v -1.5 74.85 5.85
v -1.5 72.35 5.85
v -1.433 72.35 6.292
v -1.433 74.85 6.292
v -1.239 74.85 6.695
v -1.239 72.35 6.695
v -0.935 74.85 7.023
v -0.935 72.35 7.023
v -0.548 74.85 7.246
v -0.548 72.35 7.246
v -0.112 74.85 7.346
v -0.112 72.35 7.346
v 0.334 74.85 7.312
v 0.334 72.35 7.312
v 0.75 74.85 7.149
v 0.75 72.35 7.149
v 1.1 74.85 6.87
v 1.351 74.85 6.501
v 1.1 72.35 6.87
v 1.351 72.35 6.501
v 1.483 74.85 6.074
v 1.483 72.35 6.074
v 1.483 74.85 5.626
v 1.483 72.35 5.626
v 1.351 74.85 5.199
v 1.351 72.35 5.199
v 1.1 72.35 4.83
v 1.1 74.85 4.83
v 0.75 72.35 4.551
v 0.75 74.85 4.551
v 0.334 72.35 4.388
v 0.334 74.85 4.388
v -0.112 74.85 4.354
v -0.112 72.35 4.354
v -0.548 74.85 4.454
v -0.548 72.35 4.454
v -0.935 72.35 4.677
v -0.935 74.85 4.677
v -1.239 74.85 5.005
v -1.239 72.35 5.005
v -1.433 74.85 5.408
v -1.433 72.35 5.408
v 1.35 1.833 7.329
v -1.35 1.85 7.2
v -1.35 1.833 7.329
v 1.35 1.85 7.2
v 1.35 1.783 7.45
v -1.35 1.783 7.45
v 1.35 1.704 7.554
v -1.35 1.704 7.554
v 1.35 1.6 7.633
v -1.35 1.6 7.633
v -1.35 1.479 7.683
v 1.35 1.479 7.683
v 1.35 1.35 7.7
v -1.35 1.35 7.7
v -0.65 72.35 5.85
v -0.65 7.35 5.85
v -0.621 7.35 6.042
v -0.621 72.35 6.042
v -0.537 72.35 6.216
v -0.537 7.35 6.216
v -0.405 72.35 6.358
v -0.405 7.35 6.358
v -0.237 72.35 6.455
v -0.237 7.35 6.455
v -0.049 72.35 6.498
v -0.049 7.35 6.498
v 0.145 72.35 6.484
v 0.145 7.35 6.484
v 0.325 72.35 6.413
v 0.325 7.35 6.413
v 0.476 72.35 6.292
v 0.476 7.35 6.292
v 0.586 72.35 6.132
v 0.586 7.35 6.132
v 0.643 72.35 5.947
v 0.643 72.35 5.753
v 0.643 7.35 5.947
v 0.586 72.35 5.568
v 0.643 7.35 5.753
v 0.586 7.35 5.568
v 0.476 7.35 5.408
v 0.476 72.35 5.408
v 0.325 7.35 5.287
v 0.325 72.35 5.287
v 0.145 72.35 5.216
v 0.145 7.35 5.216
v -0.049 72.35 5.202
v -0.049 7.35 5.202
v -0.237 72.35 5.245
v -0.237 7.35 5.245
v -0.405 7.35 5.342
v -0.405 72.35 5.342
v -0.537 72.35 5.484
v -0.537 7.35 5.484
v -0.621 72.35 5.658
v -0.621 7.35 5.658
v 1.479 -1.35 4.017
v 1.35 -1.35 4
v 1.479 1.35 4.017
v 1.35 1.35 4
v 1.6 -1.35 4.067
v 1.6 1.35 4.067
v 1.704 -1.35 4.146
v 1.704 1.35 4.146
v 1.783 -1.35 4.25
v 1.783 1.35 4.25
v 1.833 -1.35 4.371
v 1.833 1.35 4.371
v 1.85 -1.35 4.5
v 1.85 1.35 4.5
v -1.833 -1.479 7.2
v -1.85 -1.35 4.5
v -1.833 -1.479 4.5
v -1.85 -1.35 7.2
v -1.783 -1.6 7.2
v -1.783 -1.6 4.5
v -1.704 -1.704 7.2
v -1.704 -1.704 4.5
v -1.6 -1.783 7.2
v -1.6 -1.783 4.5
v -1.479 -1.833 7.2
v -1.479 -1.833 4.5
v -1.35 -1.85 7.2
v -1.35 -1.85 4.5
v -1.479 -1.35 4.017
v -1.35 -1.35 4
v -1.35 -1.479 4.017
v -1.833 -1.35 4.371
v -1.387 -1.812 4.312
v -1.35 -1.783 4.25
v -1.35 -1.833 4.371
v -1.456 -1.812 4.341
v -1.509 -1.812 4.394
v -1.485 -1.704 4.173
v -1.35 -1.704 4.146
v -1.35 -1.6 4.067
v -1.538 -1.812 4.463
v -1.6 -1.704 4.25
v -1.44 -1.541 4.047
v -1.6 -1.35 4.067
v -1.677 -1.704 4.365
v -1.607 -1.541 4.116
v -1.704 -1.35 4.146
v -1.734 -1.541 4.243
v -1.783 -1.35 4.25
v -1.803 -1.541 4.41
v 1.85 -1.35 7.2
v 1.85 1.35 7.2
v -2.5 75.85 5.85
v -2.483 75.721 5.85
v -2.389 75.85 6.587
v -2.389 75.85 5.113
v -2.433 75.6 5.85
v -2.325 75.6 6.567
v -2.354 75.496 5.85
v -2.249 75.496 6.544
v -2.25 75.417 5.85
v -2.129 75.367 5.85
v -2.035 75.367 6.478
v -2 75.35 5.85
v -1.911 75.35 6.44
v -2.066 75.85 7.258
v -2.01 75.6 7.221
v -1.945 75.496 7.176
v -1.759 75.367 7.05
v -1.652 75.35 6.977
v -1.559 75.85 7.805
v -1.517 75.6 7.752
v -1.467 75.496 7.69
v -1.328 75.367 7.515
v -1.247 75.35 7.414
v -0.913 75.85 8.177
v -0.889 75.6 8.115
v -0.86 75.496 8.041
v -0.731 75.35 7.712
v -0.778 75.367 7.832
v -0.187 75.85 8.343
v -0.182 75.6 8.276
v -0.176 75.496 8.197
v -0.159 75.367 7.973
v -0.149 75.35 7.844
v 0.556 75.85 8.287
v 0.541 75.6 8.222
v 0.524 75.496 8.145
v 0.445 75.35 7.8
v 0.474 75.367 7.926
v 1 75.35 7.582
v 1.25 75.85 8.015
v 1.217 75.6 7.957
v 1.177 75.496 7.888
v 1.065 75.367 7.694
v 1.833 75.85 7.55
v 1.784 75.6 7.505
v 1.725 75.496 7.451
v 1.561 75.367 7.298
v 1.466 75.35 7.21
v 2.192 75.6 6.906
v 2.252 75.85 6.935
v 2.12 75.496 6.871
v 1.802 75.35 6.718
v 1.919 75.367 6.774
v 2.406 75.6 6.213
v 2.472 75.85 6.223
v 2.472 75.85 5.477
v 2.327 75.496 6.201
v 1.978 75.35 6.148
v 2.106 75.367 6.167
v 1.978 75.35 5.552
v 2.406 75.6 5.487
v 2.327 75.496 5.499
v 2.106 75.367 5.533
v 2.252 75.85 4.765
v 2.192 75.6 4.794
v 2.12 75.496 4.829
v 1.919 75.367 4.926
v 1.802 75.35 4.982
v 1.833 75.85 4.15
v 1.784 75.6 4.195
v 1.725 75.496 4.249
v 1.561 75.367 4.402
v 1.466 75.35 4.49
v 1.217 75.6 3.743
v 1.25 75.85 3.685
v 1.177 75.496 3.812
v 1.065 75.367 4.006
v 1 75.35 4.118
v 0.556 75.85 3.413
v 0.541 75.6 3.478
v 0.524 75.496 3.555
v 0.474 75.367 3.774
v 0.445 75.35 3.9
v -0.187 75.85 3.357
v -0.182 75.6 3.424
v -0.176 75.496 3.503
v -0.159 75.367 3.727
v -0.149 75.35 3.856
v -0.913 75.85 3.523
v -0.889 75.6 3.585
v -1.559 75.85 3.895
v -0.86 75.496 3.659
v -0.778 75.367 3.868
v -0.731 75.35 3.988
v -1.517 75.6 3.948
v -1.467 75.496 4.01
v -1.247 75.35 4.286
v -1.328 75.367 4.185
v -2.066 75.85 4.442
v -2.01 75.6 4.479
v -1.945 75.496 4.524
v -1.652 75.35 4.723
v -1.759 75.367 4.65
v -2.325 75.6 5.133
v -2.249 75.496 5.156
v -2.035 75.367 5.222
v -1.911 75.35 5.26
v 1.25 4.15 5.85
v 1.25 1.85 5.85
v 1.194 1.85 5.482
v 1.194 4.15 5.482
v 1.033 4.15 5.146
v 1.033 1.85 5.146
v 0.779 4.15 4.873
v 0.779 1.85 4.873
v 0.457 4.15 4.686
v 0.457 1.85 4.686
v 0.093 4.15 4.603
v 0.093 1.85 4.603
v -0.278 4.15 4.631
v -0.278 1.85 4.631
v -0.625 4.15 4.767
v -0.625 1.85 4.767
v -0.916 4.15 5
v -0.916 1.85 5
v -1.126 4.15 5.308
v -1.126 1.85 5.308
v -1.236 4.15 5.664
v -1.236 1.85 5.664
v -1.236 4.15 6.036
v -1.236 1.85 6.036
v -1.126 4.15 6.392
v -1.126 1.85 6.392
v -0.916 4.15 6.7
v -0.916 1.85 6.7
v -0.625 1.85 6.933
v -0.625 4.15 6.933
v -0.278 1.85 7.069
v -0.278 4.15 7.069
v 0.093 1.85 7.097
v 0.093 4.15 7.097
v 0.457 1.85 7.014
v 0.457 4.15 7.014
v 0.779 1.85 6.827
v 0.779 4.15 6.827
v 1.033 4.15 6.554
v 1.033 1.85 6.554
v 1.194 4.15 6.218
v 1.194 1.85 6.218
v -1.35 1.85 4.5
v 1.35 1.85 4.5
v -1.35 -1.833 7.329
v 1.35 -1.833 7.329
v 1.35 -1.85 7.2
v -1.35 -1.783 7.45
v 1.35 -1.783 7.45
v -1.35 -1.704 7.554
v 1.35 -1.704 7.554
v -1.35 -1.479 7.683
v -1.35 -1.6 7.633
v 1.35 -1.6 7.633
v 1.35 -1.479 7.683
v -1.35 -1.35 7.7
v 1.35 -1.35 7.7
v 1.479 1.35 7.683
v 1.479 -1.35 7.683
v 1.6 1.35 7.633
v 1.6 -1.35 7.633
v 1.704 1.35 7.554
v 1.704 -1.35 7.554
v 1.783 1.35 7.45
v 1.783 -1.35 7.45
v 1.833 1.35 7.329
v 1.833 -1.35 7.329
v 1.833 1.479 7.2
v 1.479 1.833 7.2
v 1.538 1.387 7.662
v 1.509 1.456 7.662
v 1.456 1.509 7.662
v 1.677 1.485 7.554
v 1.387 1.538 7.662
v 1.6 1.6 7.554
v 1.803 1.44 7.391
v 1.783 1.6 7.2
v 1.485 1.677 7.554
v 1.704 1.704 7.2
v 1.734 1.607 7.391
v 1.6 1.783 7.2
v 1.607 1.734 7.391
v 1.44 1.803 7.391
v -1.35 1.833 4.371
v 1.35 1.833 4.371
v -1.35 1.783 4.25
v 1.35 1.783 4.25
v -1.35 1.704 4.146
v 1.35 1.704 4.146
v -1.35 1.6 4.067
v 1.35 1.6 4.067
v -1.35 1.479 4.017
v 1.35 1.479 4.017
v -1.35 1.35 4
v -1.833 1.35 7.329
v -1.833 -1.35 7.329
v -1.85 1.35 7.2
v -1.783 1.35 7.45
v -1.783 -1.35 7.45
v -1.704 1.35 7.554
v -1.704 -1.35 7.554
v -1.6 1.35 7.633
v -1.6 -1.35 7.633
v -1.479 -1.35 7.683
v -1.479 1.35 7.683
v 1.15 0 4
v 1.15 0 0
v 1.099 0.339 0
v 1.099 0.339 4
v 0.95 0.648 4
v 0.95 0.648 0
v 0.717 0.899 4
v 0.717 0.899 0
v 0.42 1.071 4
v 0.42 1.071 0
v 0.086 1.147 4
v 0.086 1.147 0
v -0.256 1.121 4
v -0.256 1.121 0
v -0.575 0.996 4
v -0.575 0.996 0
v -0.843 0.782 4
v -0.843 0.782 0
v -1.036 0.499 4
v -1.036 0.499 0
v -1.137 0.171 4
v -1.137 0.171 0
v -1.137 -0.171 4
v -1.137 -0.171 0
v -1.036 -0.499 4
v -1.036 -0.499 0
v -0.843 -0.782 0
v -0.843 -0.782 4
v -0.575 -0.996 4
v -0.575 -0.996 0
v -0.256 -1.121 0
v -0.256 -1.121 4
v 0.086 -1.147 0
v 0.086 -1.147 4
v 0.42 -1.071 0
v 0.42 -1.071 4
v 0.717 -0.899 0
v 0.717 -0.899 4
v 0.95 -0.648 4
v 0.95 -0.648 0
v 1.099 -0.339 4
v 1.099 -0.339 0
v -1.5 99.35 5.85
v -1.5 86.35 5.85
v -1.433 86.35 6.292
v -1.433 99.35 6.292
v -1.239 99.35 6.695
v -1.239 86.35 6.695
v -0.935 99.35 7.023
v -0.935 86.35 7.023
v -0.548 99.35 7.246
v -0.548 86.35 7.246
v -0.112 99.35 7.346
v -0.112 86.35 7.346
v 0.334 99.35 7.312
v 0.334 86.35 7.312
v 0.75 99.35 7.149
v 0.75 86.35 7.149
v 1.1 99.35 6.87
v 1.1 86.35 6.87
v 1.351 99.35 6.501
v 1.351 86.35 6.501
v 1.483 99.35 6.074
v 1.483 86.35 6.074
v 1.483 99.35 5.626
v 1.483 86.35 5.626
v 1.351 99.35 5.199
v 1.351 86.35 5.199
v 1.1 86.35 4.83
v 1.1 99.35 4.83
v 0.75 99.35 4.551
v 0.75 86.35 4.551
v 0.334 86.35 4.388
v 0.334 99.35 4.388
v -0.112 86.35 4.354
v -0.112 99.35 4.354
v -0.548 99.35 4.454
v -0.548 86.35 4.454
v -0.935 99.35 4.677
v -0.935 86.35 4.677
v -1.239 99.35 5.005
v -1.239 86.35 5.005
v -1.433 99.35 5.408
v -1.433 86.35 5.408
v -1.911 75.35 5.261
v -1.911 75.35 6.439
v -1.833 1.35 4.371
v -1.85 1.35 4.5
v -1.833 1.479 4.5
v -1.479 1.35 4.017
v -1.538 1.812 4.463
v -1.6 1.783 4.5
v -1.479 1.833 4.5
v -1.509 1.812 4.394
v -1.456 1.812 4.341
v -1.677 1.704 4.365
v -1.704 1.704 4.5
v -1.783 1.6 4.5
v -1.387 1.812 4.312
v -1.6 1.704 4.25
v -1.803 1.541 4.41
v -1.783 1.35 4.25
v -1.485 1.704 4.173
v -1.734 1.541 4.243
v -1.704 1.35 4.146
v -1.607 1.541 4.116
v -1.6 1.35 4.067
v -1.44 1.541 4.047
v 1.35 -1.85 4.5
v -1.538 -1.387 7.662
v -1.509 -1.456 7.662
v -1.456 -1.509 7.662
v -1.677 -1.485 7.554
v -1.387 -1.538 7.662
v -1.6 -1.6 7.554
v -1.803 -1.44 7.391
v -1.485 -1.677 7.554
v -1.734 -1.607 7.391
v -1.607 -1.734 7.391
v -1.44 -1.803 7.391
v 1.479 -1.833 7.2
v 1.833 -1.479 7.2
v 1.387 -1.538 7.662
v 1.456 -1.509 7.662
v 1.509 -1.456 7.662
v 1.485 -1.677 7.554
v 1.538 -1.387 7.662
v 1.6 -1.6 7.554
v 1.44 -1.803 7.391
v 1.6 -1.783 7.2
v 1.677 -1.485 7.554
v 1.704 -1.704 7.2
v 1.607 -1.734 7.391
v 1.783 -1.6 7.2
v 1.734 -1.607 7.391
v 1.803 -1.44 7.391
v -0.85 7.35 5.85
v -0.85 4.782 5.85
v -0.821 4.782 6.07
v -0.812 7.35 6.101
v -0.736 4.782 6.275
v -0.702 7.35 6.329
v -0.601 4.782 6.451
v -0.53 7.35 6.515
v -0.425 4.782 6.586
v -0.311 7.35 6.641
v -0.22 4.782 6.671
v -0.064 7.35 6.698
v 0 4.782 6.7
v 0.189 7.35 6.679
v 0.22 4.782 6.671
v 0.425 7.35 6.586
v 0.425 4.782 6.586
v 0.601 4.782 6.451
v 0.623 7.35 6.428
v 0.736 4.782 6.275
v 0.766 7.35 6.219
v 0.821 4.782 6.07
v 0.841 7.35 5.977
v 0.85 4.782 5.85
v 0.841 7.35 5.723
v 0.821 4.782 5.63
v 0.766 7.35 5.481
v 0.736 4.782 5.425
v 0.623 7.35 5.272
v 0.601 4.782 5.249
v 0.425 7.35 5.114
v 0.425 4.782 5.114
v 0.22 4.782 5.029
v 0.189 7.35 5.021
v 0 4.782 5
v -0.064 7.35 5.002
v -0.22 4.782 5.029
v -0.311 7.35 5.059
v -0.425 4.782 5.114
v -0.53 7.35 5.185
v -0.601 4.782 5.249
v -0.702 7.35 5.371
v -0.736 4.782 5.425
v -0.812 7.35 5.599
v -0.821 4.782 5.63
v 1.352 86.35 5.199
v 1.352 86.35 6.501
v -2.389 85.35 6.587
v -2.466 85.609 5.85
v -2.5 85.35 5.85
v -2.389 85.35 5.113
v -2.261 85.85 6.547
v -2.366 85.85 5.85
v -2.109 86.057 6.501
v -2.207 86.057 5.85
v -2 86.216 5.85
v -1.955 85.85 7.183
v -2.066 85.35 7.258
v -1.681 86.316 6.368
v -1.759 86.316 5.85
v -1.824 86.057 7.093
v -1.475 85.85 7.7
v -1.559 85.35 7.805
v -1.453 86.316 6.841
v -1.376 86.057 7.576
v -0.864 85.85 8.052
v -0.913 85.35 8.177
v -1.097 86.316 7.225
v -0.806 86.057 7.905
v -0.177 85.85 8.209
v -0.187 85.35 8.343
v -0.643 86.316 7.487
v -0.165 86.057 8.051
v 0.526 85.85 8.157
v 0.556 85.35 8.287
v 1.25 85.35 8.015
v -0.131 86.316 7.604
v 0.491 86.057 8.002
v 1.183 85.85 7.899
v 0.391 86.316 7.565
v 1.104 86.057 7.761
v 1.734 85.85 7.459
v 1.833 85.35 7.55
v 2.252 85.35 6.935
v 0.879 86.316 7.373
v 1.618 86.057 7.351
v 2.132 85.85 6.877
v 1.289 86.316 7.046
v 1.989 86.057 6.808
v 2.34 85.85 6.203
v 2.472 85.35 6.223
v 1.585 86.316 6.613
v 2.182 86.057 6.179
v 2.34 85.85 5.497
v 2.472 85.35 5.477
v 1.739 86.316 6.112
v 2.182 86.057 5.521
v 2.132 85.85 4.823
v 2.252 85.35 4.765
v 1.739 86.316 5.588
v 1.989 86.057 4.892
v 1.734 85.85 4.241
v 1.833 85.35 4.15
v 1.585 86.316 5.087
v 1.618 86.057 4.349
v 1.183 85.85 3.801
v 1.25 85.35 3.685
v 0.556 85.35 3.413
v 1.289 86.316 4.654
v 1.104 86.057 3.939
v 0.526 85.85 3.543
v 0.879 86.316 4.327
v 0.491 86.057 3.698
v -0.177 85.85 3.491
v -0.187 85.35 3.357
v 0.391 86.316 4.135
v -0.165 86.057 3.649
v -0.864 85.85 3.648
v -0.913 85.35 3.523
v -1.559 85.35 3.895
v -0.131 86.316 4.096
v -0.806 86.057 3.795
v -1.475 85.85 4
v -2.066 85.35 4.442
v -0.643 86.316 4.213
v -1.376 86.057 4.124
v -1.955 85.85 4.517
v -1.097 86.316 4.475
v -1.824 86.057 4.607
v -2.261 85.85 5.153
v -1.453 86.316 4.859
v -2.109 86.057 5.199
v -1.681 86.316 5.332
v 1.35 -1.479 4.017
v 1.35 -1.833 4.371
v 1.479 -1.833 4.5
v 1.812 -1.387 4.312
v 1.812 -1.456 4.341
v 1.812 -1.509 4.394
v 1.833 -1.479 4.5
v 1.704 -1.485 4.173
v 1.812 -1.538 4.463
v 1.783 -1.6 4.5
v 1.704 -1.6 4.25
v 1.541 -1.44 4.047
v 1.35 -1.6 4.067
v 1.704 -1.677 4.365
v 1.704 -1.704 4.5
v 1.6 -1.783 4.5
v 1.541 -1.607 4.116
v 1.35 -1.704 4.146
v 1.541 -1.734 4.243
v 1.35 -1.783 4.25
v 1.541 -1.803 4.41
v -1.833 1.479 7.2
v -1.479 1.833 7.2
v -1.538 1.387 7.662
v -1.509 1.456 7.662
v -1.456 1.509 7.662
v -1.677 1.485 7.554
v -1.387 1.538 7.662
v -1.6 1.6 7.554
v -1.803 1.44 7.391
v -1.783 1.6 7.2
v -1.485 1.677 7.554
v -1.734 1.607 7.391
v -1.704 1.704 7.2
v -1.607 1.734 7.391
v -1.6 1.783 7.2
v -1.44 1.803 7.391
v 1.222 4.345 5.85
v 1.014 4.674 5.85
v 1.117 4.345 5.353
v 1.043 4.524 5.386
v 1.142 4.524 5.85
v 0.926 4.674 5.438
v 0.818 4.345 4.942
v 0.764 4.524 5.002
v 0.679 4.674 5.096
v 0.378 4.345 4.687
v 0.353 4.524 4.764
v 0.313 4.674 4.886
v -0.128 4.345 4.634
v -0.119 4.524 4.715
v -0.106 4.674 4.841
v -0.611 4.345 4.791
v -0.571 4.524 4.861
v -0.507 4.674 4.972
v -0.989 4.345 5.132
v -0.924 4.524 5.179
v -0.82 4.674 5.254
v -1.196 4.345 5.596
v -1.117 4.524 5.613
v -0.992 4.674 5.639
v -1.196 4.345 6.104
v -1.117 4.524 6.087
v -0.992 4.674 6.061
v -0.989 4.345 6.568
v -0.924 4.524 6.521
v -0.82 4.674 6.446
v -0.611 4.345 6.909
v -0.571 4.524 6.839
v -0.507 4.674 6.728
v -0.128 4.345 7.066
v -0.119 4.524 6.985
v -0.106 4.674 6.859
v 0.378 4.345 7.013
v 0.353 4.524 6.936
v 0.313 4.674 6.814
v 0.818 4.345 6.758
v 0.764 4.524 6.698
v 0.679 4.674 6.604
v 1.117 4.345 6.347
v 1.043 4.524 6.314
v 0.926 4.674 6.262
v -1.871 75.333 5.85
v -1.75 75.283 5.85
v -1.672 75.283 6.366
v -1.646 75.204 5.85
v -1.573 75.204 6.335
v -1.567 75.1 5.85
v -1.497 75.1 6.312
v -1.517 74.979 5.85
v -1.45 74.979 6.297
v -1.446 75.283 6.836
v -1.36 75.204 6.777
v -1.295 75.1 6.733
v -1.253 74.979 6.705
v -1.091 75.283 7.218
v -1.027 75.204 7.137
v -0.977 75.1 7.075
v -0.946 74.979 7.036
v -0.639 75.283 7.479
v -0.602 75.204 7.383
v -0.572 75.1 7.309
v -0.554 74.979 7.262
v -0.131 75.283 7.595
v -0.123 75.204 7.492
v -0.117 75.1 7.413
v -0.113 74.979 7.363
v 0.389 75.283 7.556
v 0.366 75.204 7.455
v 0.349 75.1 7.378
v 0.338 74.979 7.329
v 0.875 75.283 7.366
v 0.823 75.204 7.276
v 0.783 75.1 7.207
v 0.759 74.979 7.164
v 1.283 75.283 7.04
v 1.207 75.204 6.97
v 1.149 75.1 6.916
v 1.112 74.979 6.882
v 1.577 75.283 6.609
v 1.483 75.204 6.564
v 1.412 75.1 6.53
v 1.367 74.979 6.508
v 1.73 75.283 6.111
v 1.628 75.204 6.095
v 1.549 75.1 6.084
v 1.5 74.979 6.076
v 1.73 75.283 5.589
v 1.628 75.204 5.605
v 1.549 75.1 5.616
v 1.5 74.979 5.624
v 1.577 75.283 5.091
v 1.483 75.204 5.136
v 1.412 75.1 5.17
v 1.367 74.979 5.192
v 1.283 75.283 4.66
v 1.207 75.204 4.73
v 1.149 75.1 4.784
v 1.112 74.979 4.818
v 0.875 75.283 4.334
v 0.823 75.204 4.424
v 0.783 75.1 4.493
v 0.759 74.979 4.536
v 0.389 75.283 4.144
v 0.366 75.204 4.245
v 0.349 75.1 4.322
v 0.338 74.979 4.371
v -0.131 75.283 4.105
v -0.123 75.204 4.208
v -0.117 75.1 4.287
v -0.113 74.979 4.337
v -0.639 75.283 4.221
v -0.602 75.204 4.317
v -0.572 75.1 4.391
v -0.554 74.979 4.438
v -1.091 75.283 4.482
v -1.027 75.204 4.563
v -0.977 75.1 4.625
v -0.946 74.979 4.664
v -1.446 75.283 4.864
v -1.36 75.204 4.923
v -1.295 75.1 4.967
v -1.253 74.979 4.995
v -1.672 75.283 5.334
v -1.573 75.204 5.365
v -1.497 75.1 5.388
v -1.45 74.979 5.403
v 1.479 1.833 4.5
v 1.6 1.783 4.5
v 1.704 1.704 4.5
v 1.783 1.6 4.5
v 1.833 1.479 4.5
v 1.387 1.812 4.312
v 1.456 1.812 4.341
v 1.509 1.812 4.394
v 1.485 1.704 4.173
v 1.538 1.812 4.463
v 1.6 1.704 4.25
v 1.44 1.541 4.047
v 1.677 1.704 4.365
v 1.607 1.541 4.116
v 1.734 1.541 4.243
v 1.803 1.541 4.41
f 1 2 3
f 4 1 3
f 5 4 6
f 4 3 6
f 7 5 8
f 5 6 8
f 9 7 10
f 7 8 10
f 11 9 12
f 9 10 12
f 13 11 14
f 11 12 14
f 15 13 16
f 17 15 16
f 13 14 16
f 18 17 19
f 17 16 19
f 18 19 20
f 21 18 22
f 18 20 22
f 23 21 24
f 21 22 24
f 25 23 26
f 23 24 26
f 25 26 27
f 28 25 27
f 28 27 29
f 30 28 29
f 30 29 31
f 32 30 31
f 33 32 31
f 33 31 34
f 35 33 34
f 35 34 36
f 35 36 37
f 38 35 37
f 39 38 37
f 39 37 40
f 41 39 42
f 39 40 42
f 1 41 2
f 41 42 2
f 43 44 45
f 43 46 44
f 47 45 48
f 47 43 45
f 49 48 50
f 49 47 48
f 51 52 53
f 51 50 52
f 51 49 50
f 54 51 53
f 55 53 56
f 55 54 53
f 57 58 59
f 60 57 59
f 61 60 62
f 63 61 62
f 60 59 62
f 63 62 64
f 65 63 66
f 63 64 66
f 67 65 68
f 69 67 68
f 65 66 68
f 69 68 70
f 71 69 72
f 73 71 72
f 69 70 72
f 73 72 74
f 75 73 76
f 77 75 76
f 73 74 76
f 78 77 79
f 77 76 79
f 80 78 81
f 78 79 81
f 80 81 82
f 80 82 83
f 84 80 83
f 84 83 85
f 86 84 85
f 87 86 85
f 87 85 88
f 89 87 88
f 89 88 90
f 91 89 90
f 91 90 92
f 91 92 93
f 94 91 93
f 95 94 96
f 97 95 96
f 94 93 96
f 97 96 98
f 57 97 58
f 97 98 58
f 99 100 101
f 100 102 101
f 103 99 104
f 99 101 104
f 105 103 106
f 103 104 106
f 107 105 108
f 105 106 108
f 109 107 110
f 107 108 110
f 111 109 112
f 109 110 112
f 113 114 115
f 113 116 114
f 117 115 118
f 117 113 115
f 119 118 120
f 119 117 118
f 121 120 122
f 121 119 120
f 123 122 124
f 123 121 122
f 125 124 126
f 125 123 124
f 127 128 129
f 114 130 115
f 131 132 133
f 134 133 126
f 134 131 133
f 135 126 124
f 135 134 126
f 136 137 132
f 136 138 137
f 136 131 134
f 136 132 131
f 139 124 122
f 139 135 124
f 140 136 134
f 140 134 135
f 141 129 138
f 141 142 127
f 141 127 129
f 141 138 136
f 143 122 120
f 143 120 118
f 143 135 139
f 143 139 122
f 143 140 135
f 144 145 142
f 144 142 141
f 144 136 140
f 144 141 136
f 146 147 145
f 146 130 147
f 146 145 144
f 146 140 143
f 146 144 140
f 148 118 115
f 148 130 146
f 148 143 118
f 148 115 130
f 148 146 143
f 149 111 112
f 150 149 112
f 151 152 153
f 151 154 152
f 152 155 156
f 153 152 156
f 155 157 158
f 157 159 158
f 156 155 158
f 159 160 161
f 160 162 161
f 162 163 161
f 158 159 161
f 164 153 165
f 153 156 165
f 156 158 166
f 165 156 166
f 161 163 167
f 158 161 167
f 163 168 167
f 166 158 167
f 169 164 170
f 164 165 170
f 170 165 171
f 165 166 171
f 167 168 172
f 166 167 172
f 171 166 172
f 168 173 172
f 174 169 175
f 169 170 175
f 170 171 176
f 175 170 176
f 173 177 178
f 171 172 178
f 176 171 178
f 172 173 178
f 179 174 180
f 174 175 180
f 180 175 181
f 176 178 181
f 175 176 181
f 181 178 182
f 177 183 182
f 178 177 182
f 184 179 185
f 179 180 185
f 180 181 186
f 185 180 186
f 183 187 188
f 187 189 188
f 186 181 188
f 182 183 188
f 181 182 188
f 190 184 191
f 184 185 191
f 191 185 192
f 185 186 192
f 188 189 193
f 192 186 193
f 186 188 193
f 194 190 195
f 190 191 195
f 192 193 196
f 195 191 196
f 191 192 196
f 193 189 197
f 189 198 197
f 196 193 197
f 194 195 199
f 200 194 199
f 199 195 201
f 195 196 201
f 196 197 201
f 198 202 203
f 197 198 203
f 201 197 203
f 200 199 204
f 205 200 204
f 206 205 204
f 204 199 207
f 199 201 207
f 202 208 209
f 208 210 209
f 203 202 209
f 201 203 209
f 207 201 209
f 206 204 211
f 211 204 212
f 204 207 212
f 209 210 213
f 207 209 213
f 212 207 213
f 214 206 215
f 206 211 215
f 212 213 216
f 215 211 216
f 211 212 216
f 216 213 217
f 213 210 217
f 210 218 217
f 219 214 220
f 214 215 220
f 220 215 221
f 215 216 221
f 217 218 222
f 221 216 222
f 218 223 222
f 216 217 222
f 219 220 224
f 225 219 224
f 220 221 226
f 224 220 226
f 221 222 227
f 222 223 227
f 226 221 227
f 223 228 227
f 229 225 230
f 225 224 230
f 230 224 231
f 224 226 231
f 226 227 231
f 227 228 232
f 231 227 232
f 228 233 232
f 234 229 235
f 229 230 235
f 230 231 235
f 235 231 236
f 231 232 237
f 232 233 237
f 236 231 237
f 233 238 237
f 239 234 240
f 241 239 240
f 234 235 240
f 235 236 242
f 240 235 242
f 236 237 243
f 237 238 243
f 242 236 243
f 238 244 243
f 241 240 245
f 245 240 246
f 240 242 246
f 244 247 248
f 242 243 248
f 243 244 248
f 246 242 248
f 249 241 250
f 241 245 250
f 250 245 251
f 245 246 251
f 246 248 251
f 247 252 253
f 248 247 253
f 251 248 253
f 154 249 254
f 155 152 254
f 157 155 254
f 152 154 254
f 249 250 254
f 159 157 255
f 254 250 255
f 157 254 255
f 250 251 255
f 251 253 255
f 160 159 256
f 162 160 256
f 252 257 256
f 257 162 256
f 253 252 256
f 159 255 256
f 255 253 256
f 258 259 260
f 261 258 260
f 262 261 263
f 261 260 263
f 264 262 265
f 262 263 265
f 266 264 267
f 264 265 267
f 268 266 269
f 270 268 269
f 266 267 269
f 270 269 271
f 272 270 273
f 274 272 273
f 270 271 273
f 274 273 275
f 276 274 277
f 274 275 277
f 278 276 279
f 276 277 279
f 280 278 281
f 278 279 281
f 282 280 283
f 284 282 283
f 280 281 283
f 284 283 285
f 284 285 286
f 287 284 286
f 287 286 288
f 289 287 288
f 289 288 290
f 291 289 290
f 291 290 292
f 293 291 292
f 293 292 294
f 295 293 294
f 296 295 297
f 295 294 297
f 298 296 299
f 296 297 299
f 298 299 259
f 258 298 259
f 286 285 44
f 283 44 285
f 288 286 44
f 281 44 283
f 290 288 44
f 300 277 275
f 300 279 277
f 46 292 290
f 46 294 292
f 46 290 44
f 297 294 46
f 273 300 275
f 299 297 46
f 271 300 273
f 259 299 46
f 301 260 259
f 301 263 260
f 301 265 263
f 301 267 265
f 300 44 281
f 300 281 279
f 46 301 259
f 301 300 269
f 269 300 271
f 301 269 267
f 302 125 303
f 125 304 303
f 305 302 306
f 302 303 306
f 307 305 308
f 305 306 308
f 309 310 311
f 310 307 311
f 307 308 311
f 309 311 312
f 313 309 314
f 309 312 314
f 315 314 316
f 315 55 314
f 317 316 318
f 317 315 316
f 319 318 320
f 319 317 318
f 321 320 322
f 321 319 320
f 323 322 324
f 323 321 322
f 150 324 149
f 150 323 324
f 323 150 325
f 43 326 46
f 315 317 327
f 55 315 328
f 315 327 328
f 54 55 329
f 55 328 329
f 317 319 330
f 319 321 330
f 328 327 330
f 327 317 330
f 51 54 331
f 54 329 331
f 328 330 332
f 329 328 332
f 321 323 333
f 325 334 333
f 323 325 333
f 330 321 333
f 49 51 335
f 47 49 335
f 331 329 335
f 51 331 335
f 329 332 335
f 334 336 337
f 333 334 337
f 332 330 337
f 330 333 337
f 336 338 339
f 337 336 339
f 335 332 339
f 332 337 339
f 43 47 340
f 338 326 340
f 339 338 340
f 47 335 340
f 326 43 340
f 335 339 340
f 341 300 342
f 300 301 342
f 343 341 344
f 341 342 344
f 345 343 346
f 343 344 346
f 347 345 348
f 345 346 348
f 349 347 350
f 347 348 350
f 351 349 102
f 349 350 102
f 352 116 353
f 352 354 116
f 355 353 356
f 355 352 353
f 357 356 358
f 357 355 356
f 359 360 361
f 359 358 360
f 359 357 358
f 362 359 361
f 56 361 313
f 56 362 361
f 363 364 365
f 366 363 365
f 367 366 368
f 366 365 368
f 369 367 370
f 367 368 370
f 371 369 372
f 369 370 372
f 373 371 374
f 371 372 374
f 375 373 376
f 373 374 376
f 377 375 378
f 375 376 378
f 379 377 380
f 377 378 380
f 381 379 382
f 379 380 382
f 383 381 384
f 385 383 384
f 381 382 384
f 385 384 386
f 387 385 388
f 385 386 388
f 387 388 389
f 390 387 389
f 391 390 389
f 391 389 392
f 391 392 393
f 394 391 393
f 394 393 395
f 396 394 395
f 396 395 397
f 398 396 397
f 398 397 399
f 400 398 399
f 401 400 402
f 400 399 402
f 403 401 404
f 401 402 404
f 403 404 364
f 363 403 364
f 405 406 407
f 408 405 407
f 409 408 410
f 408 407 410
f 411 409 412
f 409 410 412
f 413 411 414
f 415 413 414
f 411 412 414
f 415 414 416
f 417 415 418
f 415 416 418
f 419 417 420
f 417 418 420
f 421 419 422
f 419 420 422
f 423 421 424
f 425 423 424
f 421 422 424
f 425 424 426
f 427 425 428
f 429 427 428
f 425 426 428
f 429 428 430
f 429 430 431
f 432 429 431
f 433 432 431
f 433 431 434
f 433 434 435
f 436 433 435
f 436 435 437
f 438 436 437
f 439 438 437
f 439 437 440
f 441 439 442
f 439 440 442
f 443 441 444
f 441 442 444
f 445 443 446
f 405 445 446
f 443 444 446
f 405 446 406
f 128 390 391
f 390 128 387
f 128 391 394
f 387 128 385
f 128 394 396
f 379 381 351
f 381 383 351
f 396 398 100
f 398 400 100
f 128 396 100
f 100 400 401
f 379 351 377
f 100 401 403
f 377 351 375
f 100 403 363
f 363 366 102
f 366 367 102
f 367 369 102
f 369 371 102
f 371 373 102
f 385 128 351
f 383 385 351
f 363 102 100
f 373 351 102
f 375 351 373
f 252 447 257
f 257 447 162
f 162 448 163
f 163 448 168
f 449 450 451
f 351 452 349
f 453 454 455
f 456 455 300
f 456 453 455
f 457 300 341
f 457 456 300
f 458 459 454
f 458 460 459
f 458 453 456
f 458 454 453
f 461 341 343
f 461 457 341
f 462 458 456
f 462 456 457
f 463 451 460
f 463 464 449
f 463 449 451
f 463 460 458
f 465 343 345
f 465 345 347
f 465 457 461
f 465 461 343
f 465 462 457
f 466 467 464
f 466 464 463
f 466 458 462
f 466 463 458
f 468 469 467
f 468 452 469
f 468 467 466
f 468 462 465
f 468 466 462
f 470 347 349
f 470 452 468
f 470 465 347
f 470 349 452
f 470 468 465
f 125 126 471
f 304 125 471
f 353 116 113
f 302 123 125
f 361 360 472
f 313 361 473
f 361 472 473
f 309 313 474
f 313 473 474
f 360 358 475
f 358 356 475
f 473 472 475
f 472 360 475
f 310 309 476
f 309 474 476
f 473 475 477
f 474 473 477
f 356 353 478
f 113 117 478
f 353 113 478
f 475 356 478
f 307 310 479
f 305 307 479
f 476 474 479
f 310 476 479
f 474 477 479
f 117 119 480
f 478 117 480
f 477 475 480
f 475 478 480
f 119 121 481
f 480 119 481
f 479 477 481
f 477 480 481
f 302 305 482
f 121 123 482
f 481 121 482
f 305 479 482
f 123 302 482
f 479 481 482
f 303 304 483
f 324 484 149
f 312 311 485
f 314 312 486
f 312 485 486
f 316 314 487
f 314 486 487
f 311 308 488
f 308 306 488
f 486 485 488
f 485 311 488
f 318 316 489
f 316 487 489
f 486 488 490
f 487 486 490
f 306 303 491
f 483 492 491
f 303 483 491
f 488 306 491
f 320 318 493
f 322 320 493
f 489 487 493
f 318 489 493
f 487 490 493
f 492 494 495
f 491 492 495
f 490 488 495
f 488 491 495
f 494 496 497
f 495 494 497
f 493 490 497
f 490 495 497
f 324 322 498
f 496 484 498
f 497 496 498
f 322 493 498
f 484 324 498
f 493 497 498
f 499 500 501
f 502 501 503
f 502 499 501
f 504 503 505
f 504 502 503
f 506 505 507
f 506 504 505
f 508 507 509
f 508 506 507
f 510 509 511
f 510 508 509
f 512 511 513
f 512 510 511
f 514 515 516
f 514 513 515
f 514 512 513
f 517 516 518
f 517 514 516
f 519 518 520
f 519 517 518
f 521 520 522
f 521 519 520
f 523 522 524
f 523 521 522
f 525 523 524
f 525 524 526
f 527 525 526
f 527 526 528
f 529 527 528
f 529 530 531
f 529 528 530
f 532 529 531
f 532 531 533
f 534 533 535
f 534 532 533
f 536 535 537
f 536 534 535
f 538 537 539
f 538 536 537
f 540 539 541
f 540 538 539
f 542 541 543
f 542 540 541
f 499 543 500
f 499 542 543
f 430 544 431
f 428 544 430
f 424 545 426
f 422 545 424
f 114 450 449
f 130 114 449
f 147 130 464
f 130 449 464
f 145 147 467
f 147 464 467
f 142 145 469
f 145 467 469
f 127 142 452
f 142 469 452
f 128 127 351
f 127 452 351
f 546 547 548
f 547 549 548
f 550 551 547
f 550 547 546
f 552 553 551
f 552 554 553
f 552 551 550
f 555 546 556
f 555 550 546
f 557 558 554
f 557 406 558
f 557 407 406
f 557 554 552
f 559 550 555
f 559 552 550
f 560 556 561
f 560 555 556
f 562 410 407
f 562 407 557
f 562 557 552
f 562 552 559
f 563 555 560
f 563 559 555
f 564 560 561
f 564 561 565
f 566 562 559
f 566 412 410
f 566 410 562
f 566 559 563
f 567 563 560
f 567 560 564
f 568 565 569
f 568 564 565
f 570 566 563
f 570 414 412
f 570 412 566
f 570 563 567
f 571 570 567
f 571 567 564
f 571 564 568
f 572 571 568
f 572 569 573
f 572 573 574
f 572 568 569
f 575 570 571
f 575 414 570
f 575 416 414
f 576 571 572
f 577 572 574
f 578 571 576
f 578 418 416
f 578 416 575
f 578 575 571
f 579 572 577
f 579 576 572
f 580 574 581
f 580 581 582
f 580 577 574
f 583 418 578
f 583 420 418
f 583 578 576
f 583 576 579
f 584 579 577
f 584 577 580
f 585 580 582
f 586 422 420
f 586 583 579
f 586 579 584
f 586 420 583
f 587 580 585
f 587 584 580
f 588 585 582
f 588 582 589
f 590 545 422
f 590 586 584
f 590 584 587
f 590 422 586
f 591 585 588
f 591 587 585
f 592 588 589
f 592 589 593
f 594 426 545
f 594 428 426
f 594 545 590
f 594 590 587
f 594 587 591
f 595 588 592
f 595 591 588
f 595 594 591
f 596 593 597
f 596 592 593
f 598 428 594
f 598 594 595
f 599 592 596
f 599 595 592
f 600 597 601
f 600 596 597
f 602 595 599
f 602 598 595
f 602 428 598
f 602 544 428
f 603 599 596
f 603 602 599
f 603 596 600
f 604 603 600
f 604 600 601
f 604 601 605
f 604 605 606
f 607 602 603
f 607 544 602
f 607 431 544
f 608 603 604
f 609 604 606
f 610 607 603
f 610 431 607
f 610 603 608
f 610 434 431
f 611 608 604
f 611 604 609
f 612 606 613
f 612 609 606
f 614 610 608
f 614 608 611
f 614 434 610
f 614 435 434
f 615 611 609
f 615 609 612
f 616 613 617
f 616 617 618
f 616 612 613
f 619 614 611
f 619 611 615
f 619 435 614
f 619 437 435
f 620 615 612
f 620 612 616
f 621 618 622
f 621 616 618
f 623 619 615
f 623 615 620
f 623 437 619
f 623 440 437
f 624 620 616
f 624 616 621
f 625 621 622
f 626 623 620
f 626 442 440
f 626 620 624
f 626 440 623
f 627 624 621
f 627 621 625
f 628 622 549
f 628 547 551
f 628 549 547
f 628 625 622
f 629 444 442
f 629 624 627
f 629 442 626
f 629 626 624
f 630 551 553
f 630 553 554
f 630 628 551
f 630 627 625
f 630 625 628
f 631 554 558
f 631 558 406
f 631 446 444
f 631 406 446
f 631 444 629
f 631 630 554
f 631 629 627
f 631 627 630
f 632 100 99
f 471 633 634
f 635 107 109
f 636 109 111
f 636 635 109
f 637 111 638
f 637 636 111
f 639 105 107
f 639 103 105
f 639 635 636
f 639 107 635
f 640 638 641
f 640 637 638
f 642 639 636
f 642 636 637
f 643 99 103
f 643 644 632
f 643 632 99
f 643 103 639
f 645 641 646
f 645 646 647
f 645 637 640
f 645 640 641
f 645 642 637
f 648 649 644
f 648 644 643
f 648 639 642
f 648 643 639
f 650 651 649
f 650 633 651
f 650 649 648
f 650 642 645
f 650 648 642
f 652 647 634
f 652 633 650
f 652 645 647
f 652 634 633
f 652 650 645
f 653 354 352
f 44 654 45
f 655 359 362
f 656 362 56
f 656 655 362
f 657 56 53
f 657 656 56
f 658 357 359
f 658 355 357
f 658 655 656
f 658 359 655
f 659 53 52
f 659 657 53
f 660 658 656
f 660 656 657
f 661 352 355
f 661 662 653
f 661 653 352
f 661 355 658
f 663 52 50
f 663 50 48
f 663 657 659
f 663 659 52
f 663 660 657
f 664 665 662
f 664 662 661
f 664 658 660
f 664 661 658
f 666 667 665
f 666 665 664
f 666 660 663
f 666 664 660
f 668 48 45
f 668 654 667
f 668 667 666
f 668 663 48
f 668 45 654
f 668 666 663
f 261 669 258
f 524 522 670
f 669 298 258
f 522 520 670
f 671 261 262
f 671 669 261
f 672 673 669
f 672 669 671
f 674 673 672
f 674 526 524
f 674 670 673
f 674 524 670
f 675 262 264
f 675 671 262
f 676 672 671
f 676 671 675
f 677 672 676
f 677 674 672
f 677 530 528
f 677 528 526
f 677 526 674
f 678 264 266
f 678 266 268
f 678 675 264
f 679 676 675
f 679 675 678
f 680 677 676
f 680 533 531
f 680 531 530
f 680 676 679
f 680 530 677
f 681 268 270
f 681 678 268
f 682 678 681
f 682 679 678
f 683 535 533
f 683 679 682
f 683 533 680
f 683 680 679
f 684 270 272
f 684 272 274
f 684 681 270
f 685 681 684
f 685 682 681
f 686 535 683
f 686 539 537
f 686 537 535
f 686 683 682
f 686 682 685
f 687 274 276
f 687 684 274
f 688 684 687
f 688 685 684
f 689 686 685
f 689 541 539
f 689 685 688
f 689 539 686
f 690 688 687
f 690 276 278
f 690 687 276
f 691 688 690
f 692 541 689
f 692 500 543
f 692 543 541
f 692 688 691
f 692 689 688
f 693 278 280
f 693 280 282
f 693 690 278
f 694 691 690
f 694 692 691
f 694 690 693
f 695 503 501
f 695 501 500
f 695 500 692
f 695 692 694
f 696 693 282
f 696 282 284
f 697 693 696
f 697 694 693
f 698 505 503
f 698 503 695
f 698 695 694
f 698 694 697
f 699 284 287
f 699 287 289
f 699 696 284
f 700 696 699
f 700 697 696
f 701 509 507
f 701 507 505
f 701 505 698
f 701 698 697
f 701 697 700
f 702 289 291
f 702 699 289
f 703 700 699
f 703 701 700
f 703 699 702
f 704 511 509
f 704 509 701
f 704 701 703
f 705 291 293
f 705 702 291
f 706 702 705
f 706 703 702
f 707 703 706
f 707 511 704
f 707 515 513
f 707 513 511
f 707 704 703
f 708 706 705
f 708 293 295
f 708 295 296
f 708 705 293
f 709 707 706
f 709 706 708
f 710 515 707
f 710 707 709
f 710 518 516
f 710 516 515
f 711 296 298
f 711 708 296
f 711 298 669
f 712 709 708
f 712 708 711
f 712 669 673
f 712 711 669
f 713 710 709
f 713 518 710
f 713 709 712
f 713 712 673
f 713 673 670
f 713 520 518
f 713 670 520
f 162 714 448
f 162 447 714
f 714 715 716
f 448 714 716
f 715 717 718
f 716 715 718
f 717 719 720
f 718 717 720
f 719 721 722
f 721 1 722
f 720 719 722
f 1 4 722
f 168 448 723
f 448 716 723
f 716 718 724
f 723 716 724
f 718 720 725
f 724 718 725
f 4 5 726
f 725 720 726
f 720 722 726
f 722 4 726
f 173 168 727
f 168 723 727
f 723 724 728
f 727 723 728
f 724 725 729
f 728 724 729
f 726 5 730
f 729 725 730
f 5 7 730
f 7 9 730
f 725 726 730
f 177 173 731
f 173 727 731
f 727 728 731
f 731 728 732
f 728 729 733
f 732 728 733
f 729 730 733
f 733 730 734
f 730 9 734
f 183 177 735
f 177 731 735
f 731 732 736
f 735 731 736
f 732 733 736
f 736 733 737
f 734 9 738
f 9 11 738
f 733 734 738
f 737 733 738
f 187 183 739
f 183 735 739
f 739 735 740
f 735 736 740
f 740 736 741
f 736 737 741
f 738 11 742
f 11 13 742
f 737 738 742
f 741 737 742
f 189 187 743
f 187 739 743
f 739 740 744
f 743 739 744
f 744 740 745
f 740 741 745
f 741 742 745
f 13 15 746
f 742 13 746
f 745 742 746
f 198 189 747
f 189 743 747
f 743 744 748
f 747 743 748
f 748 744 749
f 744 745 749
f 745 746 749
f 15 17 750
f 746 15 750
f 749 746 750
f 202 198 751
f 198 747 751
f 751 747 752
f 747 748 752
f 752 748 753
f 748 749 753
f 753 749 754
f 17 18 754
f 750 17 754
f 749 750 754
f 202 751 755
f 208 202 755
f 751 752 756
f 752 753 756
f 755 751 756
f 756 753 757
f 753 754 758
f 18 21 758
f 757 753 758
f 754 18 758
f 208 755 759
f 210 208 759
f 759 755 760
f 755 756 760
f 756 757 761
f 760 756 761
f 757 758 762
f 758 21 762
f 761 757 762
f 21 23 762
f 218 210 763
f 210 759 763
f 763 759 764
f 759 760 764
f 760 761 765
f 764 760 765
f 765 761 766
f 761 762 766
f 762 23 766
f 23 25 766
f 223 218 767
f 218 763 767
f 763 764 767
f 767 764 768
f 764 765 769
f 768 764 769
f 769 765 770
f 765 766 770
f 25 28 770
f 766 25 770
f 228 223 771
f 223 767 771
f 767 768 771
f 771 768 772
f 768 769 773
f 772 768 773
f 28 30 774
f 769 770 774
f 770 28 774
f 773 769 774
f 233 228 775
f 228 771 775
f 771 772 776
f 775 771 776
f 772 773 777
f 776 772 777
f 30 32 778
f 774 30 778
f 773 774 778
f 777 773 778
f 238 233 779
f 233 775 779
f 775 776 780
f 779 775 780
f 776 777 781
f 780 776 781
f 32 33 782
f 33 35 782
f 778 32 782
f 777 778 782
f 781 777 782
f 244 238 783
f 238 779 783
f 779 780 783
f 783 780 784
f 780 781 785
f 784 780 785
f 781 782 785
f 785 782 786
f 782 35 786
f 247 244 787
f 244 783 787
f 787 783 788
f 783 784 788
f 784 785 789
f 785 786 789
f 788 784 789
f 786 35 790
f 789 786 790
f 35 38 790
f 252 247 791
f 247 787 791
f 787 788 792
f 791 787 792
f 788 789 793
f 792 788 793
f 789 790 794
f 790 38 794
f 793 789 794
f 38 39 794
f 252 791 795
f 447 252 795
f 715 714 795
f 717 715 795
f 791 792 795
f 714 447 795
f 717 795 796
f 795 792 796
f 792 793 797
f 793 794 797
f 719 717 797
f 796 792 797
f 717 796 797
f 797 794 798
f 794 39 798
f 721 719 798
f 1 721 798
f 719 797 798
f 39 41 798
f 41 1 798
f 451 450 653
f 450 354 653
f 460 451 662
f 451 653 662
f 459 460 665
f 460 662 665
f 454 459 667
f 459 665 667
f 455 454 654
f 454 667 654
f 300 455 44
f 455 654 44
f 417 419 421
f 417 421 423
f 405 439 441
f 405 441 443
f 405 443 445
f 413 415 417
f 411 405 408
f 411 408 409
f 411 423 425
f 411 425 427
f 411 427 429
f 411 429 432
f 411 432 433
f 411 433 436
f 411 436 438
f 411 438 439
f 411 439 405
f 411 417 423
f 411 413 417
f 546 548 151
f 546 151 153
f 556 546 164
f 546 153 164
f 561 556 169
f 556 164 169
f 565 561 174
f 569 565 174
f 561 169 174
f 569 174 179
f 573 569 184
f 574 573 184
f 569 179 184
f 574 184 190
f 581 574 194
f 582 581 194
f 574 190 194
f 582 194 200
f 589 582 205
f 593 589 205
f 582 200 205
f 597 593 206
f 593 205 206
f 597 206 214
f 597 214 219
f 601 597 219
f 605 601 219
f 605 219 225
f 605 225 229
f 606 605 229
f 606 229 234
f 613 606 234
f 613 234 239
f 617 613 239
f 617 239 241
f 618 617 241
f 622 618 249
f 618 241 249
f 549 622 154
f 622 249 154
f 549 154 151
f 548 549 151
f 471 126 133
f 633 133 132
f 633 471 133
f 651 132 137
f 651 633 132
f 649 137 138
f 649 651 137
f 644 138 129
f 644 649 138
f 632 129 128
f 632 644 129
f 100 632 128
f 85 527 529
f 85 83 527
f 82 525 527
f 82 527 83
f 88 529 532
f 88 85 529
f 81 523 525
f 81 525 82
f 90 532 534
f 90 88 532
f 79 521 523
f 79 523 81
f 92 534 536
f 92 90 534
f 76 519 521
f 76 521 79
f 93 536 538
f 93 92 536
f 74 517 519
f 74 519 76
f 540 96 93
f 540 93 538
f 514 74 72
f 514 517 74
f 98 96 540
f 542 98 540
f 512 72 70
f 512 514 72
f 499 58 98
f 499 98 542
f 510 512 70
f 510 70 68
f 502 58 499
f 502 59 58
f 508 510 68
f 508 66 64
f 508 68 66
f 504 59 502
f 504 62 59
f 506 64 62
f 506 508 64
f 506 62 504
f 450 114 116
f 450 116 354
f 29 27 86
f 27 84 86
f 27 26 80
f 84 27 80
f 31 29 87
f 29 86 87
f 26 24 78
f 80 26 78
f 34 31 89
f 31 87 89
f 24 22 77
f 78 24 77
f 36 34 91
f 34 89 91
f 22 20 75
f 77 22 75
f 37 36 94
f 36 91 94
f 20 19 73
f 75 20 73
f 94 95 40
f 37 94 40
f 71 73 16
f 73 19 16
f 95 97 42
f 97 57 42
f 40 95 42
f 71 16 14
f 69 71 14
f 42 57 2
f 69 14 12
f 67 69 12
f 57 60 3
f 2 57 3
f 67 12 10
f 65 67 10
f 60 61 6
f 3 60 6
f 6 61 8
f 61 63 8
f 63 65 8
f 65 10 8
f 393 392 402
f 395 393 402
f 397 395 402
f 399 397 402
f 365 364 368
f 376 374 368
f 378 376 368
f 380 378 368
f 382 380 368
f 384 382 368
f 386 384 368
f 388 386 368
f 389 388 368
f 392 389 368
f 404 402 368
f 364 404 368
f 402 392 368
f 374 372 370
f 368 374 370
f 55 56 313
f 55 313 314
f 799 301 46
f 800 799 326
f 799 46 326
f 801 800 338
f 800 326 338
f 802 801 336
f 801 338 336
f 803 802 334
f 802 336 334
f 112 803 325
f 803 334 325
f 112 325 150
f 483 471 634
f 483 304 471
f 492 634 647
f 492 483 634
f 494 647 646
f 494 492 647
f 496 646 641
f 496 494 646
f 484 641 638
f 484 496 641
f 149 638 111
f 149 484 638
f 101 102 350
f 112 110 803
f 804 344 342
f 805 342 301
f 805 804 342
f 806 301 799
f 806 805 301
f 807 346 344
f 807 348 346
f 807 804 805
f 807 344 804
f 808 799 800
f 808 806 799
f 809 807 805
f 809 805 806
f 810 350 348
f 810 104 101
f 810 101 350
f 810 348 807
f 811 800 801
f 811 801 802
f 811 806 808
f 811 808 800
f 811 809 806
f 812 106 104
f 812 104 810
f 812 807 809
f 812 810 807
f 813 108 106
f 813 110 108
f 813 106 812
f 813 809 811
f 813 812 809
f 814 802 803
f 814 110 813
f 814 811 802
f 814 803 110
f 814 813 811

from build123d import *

# Parameters (mm, degrees)
SKETCH1_R                       = 1.15
BOSS_EXTRUDE1_DEPTH             = 4
SKETCH2_W                       = 3.7
SKETCH2_H                       = 3.7
BOSS_EXTRUDE2_DEPTH             = 3.7
FILLET1_R                       = 0.5
SKETCH3_R                       = 1.25
BOSS_EXTRUDE3_DEPTH             = 3
FILLET2_R                       = 0.7
SKETCH4_R                       = 0.85
BOSS_EXTRUDE4_DEPTH             = 2.5
BOSS_EXTRUDE4_DIRECTION_2_REACH = 12.373
SKETCH5_R                       = 0.65
BOSS_EXTRUDE5_DEPTH             = 65
SKETCH6_R                       = 1.5
BOSS_EXTRUDE6_DEPTH             = 3
SKETCH7_R                       = 2.5
BOSS_EXTRUDE7_DEPTH             = 11
SKETCH8_R                       = 1.5
BOSS_EXTRUDE8_DEPTH             = 13
FILLET3_R                       = 1
FILLET4_R                       = 0.5
FILLET5_R                       = 0.5


with BuildPart() as part:
    # Sketch1 → Boss-Extrude1 (new body)
    with BuildSketch(Plane.XY):
        Circle(SKETCH1_R)
    extrude(amount=BOSS_EXTRUDE1_DEPTH)

    # Sketch2 → Boss-Extrude2 (add)
    with BuildSketch(Plane.XY.offset(4)):
        Rectangle(SKETCH2_W, SKETCH2_H)
    extrude(amount=BOSS_EXTRUDE2_DEPTH)

    # Fillet1
    fillet1_edges = [part.edges().sort_by_distance(p)[0] for p in [
        (-1.85, 0, 4),
        (-1.85, 1.85, 5.85),
        (0, -1.85, 4),
        (-1.85, -1.85, 5.85),
        (1.85, 0, 4),
        (1.85, -1.85, 5.85),
        (0, 1.85, 4),
        (1.85, 1.85, 5.85),
        (-1.85, 0, 7.7),
        (0, -1.85, 7.7),
        (1.85, 0, 7.7),
        (0, 1.85, 7.7),
    ]]
    fillet(fillet1_edges, radius=FILLET1_R)

    # Sketch3 → Boss-Extrude3 (add)
    with BuildSketch(Plane(origin=(0, 1.85, 0), x_dir=(1, 0, 0), z_dir=(0, 1, 0))):
        with Locations((0, -5.85)):
            Circle(SKETCH3_R)
    extrude(amount=BOSS_EXTRUDE3_DEPTH)

    # Fillet2
    fillet2_edges = [part.edges().sort_by_distance(p)[0] for p in [
        (-1.25, 4.85, 5.85),
    ]]
    fillet(fillet2_edges, radius=FILLET2_R)

    # Sketch4 → Boss-Extrude4 (add)
    with BuildSketch(Plane(origin=(0, 4.85, 0), x_dir=(1, 0, 0), z_dir=(0, 1, 0))):
        with Locations(Location((0, -5.85, 0), (0, 0, 180))):
            Circle(SKETCH4_R)
    extrude(amount=BOSS_EXTRUDE4_DEPTH)

    # Sketch4 → Boss-Extrude4 direction 2 (add, up to next)
    with BuildSketch(Plane(origin=(0, 4.85, 0), x_dir=(1, 0, 0), z_dir=(0, 1, 0)), mode=Mode.PRIVATE) as boss_extrude4_direction_2_sk1:
        with Locations(Location((0, -5.85, 0), (0, 0, 180))):
            Circle(SKETCH4_R)
    boss_extrude4_direction_2_tool1 = extrude(boss_extrude4_direction_2_sk1.sketch, amount=-BOSS_EXTRUDE4_DIRECTION_2_REACH, mode=Mode.PRIVATE) - part.part
    add(boss_extrude4_direction_2_tool1.solids().sort_by_distance((0, 4.85, 5.85))[0])

    # Sketch5 → Boss-Extrude5 (add)
    with BuildSketch(Plane(origin=(0, 7.35, 0), x_dir=(1, 0, 0), z_dir=(0, 1, 0))):
        with Locations(Location((0, -5.85, 0), (0, 0, 180))):
            Circle(SKETCH5_R)
    extrude(amount=BOSS_EXTRUDE5_DEPTH)

    # Sketch6 → Boss-Extrude6 (add)
    with BuildSketch(Plane(origin=(0, 72.35, 0), x_dir=(1, 0, 0), z_dir=(0, 1, 0))):
        with Locations(Location((0, -5.85, 0), (0, 0, 180))):
            Circle(SKETCH6_R)
    extrude(amount=BOSS_EXTRUDE6_DEPTH)

    # Sketch7 → Boss-Extrude7 (add)
    with BuildSketch(Plane(origin=(0, 75.35, 0), x_dir=(1, 0, 0), z_dir=(0, 1, 0))):
        with Locations(Location((0, -5.85, 0), (0, 0, 180))):
            Circle(SKETCH7_R)
    extrude(amount=BOSS_EXTRUDE7_DEPTH)

    # Sketch8 → Boss-Extrude8 (add)
    with BuildSketch(Plane(origin=(0, 86.35, 0), x_dir=(1, 0, 0), z_dir=(0, 1, 0))):
        with Locations(Location((0, -5.85, 0), (0, 0, 180))):
            Circle(SKETCH8_R)
    extrude(amount=BOSS_EXTRUDE8_DEPTH)

    # Fillet3
    fillet3_edges = [part.edges().sort_by_distance(p)[0] for p in [
        (2.5, 86.35, 5.85),
    ]]
    fillet(fillet3_edges, radius=FILLET3_R - 0.0001)  # a hair under: the kernel refuses the full size

    # Fillet4
    fillet4_edges = [part.edges().sort_by_distance(p)[0] for p in [
        (2.5, 75.35, 5.85),
    ]]
    fillet(fillet4_edges, radius=FILLET4_R)

    # Fillet5
    fillet5_edges = [part.edges().sort_by_distance(p)[0] for p in [
        (1.5, 75.35, 5.85),
    ]]
    fillet(fillet5_edges, radius=FILLET5_R - 0.0001)  # a hair under: the kernel refuses the full size


solid = part.part
